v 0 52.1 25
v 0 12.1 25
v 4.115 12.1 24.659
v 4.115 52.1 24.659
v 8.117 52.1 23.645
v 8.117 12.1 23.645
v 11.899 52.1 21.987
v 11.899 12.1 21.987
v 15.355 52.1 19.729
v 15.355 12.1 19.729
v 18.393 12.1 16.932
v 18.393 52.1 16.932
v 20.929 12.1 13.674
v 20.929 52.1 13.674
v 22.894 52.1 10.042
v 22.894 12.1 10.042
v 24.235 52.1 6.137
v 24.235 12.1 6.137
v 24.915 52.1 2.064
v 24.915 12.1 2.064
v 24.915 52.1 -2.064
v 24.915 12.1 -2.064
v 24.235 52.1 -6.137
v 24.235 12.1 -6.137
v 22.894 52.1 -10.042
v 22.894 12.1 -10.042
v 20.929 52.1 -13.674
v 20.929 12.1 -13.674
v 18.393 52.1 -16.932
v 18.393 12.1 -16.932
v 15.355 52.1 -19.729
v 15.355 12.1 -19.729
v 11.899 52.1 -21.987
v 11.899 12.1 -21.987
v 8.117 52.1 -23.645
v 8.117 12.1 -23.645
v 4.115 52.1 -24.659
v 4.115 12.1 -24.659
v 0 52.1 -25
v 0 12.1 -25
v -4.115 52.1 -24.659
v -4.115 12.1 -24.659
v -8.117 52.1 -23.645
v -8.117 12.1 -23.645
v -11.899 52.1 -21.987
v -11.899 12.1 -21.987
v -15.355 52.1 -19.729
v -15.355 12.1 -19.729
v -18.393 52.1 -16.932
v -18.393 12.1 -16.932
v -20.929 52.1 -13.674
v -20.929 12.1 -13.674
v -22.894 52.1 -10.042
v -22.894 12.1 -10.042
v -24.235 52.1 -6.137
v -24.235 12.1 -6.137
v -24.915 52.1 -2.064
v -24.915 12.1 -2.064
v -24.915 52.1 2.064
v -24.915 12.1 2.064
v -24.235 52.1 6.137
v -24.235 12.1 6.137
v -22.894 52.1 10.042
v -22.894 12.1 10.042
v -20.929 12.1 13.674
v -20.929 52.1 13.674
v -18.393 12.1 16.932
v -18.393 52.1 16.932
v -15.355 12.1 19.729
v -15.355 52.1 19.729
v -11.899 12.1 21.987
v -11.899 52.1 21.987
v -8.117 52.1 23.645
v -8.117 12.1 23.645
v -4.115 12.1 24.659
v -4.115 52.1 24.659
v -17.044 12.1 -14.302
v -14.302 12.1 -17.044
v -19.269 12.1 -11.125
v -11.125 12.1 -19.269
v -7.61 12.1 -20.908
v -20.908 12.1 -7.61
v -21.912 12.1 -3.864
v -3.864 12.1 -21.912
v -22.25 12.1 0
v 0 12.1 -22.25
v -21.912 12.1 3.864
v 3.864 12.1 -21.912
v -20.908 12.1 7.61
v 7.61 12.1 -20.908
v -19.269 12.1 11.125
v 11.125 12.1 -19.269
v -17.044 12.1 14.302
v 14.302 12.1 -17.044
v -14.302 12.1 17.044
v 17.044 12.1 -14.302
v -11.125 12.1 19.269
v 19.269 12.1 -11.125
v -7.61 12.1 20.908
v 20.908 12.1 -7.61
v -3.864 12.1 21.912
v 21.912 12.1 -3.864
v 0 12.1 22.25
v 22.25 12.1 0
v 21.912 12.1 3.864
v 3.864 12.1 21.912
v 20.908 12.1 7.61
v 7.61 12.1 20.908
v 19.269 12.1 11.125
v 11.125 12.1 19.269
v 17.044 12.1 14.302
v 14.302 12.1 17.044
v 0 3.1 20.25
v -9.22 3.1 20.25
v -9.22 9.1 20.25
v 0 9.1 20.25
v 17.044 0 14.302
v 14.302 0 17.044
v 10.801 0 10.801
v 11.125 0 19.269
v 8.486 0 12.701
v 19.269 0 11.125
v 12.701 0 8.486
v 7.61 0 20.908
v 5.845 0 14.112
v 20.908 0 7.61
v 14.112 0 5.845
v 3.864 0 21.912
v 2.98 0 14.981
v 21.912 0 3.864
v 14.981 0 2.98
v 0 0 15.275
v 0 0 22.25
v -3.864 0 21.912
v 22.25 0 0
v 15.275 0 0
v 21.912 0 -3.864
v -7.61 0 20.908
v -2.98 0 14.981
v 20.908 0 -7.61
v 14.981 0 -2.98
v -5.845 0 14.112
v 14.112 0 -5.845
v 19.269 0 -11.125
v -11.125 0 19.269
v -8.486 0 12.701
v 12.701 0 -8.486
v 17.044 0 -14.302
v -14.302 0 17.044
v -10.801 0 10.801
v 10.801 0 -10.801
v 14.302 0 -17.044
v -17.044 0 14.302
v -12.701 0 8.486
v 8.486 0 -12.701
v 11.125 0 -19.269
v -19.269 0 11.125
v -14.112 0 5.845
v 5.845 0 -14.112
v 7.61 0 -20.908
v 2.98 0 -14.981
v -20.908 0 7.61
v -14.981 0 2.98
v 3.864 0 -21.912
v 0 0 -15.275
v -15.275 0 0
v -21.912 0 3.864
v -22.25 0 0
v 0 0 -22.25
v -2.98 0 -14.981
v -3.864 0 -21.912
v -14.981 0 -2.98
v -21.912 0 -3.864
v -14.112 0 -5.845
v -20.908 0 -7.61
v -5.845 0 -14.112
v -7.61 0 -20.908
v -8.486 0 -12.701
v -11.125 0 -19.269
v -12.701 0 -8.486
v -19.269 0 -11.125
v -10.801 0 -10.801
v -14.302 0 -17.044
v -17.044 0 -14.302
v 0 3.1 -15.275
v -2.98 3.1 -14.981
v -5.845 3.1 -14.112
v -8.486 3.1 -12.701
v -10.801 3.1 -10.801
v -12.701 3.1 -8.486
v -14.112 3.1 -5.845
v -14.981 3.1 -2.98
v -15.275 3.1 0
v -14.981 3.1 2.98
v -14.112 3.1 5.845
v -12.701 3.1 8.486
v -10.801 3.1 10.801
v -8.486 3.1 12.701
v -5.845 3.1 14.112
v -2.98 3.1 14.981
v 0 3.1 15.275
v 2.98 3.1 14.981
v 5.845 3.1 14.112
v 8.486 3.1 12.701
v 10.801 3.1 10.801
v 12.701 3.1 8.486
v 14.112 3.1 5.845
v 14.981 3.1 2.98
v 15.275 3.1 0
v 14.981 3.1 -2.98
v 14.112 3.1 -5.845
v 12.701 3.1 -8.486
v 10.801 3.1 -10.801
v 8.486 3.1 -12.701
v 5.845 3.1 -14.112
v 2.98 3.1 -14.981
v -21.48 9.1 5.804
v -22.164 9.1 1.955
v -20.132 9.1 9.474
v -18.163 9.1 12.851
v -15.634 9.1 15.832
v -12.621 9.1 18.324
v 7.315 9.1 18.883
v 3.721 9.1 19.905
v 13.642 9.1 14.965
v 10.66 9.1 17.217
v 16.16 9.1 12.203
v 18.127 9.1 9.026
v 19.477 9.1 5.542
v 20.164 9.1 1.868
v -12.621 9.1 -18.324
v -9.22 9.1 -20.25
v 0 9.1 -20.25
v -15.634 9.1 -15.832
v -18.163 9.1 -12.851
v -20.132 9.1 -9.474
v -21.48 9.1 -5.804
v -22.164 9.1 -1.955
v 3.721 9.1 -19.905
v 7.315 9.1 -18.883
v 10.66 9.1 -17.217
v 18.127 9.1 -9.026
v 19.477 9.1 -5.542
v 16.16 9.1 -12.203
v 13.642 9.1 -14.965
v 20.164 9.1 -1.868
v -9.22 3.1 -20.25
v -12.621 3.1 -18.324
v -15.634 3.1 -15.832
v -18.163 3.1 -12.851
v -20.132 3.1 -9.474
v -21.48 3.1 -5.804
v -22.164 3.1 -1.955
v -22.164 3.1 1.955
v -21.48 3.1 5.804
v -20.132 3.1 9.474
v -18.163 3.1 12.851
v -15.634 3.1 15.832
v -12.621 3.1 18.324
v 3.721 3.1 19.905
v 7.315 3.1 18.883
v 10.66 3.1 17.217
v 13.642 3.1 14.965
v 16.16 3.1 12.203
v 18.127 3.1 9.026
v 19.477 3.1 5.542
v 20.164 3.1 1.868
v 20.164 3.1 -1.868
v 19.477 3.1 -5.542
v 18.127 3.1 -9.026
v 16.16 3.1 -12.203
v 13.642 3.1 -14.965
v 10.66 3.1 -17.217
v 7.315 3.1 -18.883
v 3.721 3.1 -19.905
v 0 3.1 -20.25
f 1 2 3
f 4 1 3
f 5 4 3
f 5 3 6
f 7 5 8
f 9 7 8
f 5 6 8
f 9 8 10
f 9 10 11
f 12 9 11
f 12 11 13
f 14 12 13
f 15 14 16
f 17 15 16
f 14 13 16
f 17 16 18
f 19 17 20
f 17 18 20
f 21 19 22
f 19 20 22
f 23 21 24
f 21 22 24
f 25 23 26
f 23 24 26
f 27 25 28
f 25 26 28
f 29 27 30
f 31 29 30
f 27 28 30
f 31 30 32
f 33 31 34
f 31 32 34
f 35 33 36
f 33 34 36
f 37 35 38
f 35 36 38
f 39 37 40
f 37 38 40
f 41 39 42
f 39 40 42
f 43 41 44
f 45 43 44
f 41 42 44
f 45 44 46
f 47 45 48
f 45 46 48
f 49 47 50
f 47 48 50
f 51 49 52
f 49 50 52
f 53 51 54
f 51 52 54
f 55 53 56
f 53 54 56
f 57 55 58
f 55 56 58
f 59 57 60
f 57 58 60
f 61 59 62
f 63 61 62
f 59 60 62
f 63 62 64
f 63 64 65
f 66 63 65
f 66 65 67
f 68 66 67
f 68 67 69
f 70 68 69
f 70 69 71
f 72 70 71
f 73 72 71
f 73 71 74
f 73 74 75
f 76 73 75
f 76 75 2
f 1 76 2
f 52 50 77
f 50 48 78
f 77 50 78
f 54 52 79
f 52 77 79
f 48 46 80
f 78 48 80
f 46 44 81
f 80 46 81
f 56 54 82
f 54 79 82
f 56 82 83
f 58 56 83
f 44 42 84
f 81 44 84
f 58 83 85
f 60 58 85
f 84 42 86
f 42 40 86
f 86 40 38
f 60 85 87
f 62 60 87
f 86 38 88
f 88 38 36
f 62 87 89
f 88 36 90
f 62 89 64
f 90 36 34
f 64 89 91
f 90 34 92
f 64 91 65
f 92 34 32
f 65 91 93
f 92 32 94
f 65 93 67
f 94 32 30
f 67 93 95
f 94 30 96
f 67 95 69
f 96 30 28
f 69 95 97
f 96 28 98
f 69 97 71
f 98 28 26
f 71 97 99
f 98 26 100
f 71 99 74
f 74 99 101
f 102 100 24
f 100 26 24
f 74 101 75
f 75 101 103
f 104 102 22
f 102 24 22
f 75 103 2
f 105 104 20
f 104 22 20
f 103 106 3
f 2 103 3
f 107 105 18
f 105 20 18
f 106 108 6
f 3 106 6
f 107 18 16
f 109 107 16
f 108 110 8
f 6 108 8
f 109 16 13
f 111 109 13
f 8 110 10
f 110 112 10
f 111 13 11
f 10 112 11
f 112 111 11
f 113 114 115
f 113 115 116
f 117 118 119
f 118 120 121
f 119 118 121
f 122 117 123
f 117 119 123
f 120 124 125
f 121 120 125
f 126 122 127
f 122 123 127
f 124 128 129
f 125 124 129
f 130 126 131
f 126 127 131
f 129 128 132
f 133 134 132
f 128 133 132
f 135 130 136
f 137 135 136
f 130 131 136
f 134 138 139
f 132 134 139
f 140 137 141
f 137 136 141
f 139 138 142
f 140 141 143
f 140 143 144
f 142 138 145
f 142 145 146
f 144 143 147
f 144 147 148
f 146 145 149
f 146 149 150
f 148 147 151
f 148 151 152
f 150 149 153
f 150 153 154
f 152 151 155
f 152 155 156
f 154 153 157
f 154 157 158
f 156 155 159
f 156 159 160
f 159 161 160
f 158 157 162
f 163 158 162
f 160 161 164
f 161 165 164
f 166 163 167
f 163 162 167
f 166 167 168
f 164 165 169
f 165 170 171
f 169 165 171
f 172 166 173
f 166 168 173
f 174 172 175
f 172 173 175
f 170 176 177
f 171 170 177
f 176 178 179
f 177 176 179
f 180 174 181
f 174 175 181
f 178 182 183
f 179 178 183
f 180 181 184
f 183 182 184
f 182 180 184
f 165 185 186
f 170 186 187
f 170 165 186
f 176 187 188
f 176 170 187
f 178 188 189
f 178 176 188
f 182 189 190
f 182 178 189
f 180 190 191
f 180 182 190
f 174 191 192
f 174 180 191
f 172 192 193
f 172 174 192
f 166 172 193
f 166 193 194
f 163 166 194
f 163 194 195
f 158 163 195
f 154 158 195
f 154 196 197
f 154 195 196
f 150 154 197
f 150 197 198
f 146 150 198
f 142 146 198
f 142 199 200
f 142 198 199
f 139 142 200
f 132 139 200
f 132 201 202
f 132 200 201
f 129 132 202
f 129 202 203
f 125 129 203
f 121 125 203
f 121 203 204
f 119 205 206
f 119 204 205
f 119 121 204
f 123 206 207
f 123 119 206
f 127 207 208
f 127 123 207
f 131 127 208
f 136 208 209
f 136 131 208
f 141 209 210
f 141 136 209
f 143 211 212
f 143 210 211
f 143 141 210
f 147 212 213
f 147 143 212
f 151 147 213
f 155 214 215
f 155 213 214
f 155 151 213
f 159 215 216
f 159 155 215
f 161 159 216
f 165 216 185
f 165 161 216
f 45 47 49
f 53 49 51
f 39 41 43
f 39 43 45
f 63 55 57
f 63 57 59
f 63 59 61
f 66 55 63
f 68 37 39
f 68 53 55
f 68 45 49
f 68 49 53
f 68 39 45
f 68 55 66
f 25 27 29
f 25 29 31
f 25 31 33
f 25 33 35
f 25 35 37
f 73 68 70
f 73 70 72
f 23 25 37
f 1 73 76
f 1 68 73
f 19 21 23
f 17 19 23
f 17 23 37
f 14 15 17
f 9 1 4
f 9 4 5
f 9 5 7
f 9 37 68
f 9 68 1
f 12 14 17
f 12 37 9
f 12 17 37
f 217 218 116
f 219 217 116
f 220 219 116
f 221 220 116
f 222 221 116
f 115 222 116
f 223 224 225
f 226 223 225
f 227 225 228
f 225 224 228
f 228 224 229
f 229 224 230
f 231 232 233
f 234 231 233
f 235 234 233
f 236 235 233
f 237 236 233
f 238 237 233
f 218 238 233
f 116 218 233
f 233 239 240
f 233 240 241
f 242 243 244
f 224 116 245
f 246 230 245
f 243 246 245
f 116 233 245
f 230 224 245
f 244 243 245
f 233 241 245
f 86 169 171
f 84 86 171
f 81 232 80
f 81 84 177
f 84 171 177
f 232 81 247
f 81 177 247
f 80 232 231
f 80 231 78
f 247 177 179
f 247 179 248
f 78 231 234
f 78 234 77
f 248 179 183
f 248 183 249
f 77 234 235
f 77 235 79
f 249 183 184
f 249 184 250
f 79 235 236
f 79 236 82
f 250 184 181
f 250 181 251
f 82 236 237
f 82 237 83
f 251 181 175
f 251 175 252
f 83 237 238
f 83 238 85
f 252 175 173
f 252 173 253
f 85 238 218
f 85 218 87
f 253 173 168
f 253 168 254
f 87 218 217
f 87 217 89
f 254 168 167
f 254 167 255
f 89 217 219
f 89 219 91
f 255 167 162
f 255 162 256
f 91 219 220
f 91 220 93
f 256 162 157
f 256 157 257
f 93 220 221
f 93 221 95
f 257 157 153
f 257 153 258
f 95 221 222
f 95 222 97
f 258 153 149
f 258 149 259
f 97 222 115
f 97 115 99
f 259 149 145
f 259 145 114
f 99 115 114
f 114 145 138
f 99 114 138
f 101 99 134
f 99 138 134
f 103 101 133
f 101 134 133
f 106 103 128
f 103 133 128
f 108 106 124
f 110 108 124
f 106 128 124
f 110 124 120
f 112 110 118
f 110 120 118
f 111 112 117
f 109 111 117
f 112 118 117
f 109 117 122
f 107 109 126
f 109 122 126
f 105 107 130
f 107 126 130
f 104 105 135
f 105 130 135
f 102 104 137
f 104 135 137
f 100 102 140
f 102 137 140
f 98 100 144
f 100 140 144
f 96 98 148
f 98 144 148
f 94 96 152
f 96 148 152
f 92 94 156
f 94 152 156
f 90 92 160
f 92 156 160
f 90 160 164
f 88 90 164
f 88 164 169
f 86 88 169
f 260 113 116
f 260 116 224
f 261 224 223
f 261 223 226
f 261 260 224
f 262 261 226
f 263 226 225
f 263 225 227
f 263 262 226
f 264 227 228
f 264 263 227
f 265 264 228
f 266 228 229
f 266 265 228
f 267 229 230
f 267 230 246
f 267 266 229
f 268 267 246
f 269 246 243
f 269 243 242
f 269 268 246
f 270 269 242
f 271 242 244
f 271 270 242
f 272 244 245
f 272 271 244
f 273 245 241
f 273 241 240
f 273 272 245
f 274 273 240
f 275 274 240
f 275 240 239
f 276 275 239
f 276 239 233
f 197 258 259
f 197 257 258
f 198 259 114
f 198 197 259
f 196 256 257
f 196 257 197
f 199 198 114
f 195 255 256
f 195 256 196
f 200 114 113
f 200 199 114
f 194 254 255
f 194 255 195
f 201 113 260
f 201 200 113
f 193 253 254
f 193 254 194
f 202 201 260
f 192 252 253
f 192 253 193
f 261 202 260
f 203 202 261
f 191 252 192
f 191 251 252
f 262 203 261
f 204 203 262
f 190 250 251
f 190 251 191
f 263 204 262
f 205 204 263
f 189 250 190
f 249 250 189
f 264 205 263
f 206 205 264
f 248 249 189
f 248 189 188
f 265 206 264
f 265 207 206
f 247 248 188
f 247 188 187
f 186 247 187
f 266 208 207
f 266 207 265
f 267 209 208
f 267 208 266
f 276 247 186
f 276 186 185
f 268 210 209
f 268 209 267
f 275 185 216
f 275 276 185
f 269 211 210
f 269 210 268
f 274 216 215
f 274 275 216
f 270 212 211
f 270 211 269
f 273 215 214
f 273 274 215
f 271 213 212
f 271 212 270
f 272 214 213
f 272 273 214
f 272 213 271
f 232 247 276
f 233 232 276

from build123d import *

# Parameters (mm, degrees)
SKETCH5_R           = 22.25
SKETCH5_R_2         = 15.275
BOSS_EXTRUDE1_DEPTH = 3.1
SKETCH6_R           = 22.25
SKETCH6_R_2         = 20.25
BOSS_EXTRUDE2_DEPTH = 6
SKETCH7_R           = 22.25
BOSS_EXTRUDE3_DEPTH = 3
SKETCH8_R           = 25
BOSS_EXTRUDE4_DEPTH = 40
SKETCH9_W           = 22.25
SKETCH9_H           = 40.5
CUT_EXTRUDE1_DEPTH  = 6


with BuildPart() as part:
    # Sketch5 → Boss-Extrude1 (new body)
    with BuildSketch(Plane(origin=(0, 0, 0), x_dir=(1, 0, 0), z_dir=(0, 1, 0))):
        with Locations(Location((0, 0, 0), (0, 0, 90))):
            Circle(SKETCH5_R)
        with Locations(Location((0, 0, 0), (0, 0, 90))):
            Circle(SKETCH5_R_2, mode=Mode.SUBTRACT)
    extrude(amount=BOSS_EXTRUDE1_DEPTH)

    # Sketch6 → Boss-Extrude2 (add)
    with BuildSketch(Plane(origin=(0, 3.1, 0), x_dir=(1, 0, 0), z_dir=(0, 1, 0))):
        with Locations(Location((0, 0, 0), (0, 0, 90))):
            Circle(SKETCH6_R)
        with Locations(Location((0, 0, 0), (0, 0, 270))):
            Circle(SKETCH6_R_2, mode=Mode.SUBTRACT)
    extrude(amount=BOSS_EXTRUDE2_DEPTH)

    # Sketch7 → Boss-Extrude3 (add)
    with BuildSketch(Plane(origin=(0, 9.1, 0), x_dir=(1, 0, 0), z_dir=(0, 1, 0))):
        with Locations(Location((0, 0, 0), (0, 0, 90))):
            Circle(SKETCH7_R)
    extrude(amount=BOSS_EXTRUDE3_DEPTH)

    # Sketch8 → Boss-Extrude4 (add)
    with BuildSketch(Plane(origin=(0, 12.1, 0), x_dir=(1, 0, 0), z_dir=(0, 1, 0))):
        with Locations(Location((0, 0, 0), (0, 0, 270))):
            Circle(SKETCH8_R)
    extrude(amount=BOSS_EXTRUDE4_DEPTH)

    # Sketch9 → Cut-Extrude1 (cut)
    with BuildSketch(Plane(origin=(0, 3.1, 0), x_dir=(1, 0, 0), z_dir=(0, 1, 0))):
        with Locations((-11.125, 0)):
            Rectangle(SKETCH9_W, SKETCH9_H)
    extrude(amount=CUT_EXTRUDE1_DEPTH, mode=Mode.SUBTRACT)


solid = part.part
